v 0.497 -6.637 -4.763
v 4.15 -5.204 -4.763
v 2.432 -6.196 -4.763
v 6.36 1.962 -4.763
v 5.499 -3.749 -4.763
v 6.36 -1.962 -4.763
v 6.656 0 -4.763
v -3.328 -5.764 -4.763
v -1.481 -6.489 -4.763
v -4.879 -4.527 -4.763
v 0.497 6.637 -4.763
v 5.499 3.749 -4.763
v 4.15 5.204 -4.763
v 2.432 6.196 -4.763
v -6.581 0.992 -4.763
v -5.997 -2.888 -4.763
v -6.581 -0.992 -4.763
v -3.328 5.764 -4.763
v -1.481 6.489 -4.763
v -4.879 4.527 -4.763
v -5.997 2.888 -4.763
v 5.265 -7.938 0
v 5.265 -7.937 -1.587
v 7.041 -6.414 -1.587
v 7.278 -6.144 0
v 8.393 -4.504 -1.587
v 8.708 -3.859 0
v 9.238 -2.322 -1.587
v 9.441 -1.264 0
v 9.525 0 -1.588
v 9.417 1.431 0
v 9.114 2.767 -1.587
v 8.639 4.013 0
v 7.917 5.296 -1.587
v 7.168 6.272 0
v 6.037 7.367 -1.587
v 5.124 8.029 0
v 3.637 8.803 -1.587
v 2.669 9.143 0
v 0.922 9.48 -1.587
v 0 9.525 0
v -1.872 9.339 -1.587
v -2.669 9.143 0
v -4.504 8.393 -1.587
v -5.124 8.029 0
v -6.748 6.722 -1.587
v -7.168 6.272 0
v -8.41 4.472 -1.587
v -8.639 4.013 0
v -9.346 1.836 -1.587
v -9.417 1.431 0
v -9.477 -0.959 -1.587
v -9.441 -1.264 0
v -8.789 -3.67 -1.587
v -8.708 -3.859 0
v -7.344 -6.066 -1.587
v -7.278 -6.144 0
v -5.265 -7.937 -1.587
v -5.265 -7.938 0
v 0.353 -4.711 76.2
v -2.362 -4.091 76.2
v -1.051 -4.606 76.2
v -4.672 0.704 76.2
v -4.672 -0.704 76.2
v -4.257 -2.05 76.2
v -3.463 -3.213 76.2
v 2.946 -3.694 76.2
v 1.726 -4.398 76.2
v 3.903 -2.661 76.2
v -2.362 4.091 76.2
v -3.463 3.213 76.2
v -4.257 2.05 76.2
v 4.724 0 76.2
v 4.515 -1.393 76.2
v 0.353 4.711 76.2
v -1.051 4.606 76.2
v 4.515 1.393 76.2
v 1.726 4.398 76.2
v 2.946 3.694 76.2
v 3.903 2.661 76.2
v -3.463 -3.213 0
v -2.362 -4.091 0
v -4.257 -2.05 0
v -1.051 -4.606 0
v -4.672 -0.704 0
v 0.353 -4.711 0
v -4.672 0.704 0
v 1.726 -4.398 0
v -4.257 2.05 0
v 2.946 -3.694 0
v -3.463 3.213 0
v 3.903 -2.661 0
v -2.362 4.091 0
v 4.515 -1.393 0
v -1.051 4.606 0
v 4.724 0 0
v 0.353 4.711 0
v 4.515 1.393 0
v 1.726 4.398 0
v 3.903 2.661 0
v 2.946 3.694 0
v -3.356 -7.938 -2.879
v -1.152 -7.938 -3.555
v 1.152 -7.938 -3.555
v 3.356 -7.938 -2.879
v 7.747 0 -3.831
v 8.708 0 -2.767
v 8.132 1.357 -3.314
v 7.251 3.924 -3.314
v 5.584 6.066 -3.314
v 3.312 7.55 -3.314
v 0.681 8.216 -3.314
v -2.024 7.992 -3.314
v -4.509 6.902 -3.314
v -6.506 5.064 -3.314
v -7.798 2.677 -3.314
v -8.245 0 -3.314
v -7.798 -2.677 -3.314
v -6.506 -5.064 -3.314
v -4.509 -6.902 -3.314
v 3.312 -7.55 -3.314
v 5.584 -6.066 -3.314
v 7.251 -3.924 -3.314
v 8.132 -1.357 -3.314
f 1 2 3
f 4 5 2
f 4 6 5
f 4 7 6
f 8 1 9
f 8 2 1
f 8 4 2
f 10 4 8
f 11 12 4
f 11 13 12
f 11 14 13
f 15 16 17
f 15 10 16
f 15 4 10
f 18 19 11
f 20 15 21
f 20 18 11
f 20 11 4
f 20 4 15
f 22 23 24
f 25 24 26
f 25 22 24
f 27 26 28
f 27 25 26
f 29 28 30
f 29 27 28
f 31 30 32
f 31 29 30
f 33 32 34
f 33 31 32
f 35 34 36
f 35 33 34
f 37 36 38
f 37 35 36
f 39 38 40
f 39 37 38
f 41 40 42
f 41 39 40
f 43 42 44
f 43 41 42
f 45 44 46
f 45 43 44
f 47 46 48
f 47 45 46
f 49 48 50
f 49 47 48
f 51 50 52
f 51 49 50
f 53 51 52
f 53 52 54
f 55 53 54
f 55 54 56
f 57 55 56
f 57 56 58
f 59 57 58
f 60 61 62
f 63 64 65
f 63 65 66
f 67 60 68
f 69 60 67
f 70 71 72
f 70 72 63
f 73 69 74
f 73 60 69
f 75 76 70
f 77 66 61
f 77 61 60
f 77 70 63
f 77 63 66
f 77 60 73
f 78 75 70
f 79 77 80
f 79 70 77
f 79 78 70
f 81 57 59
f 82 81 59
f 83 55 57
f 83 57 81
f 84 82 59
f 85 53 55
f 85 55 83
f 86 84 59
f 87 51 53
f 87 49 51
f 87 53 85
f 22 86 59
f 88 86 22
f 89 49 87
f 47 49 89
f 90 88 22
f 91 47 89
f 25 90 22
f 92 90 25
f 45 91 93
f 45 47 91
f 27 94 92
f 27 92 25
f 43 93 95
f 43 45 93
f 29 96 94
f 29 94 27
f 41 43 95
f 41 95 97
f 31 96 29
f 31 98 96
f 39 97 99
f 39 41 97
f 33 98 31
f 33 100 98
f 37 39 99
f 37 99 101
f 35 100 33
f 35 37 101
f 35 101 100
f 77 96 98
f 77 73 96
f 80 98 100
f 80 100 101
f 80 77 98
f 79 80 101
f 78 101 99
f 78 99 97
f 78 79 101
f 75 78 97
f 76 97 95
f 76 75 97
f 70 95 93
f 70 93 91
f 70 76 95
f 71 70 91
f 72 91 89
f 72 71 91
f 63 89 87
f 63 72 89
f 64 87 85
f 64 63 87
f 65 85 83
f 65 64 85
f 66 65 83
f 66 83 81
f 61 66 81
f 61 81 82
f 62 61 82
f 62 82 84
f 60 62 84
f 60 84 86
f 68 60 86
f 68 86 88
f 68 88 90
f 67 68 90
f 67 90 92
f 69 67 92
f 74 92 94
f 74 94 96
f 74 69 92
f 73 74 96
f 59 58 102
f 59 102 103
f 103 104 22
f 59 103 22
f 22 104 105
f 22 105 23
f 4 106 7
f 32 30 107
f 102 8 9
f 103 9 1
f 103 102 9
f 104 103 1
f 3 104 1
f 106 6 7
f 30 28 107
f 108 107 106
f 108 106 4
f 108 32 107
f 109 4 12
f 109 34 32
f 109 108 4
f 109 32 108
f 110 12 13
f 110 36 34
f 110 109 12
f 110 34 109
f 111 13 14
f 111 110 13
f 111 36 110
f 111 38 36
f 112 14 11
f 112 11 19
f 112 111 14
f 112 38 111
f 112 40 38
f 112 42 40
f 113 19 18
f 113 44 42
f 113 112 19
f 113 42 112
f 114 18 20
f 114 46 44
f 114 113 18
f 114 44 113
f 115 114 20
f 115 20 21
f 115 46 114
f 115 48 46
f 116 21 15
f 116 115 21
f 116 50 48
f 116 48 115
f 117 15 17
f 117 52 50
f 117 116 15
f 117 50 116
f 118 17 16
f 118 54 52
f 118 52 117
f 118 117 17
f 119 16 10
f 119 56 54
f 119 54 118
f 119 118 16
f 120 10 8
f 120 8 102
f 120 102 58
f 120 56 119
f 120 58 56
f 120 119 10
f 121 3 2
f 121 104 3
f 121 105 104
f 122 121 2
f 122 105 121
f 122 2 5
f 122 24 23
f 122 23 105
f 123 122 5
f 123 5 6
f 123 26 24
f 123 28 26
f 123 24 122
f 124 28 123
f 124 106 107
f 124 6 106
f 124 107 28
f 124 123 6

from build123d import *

# Parameters (mm, degrees)
F3_DEPTH = 4.7625


# Not quite as in the source:
# - a length typed as a fraction of an inch, garbled in the dataset ("3 / 203.2 mm" for 3/8 in), is restored


with BuildPart() as f1:
    # F0 (on Front) → F1 (revolve)
    with BuildSketch(Plane.XZ):
        with BuildLine():
            Line((0, 76.2), (0, 0))
            Line((0, 0), (0, -4.7625))
            Line((0, -4.7625), (6.655733594, -4.7625))
            ThreePointArc((6.655733594, -4.7625), (8.2446462119, -3.314423226), (9.525, -1.5875))
            Line((9.525, -1.5875), (9.525, 0))
            Line((9.525, 0), (4.7244, 0))
            Line((4.7244, 0), (4.7244, 76.2))
            Line((4.7244, 76.2), (0, 76.2))
        make_face()
    revolve(axis=Axis((0, 0, 38.1), (0, 0, 1)))

    # F2 (on face) → F3 (cut)
    with BuildSketch(Plane(origin=(0, 0, -4.7625), x_dir=(1, 0, 0), z_dir=(0, 0, -1))):
        with BuildLine():
            Line((0, 7.9375), (5.2651418547, 7.9375))
            ThreePointArc((5.2651418547, 7.9375), (0, 9.525), (-5.2651418547, 7.9375))
            Line((-5.2651418547, 7.9375), (0, 7.9375))
        make_face()
    extrude(amount=-F3_DEPTH, mode=Mode.SUBTRACT)


solid = f1.part
